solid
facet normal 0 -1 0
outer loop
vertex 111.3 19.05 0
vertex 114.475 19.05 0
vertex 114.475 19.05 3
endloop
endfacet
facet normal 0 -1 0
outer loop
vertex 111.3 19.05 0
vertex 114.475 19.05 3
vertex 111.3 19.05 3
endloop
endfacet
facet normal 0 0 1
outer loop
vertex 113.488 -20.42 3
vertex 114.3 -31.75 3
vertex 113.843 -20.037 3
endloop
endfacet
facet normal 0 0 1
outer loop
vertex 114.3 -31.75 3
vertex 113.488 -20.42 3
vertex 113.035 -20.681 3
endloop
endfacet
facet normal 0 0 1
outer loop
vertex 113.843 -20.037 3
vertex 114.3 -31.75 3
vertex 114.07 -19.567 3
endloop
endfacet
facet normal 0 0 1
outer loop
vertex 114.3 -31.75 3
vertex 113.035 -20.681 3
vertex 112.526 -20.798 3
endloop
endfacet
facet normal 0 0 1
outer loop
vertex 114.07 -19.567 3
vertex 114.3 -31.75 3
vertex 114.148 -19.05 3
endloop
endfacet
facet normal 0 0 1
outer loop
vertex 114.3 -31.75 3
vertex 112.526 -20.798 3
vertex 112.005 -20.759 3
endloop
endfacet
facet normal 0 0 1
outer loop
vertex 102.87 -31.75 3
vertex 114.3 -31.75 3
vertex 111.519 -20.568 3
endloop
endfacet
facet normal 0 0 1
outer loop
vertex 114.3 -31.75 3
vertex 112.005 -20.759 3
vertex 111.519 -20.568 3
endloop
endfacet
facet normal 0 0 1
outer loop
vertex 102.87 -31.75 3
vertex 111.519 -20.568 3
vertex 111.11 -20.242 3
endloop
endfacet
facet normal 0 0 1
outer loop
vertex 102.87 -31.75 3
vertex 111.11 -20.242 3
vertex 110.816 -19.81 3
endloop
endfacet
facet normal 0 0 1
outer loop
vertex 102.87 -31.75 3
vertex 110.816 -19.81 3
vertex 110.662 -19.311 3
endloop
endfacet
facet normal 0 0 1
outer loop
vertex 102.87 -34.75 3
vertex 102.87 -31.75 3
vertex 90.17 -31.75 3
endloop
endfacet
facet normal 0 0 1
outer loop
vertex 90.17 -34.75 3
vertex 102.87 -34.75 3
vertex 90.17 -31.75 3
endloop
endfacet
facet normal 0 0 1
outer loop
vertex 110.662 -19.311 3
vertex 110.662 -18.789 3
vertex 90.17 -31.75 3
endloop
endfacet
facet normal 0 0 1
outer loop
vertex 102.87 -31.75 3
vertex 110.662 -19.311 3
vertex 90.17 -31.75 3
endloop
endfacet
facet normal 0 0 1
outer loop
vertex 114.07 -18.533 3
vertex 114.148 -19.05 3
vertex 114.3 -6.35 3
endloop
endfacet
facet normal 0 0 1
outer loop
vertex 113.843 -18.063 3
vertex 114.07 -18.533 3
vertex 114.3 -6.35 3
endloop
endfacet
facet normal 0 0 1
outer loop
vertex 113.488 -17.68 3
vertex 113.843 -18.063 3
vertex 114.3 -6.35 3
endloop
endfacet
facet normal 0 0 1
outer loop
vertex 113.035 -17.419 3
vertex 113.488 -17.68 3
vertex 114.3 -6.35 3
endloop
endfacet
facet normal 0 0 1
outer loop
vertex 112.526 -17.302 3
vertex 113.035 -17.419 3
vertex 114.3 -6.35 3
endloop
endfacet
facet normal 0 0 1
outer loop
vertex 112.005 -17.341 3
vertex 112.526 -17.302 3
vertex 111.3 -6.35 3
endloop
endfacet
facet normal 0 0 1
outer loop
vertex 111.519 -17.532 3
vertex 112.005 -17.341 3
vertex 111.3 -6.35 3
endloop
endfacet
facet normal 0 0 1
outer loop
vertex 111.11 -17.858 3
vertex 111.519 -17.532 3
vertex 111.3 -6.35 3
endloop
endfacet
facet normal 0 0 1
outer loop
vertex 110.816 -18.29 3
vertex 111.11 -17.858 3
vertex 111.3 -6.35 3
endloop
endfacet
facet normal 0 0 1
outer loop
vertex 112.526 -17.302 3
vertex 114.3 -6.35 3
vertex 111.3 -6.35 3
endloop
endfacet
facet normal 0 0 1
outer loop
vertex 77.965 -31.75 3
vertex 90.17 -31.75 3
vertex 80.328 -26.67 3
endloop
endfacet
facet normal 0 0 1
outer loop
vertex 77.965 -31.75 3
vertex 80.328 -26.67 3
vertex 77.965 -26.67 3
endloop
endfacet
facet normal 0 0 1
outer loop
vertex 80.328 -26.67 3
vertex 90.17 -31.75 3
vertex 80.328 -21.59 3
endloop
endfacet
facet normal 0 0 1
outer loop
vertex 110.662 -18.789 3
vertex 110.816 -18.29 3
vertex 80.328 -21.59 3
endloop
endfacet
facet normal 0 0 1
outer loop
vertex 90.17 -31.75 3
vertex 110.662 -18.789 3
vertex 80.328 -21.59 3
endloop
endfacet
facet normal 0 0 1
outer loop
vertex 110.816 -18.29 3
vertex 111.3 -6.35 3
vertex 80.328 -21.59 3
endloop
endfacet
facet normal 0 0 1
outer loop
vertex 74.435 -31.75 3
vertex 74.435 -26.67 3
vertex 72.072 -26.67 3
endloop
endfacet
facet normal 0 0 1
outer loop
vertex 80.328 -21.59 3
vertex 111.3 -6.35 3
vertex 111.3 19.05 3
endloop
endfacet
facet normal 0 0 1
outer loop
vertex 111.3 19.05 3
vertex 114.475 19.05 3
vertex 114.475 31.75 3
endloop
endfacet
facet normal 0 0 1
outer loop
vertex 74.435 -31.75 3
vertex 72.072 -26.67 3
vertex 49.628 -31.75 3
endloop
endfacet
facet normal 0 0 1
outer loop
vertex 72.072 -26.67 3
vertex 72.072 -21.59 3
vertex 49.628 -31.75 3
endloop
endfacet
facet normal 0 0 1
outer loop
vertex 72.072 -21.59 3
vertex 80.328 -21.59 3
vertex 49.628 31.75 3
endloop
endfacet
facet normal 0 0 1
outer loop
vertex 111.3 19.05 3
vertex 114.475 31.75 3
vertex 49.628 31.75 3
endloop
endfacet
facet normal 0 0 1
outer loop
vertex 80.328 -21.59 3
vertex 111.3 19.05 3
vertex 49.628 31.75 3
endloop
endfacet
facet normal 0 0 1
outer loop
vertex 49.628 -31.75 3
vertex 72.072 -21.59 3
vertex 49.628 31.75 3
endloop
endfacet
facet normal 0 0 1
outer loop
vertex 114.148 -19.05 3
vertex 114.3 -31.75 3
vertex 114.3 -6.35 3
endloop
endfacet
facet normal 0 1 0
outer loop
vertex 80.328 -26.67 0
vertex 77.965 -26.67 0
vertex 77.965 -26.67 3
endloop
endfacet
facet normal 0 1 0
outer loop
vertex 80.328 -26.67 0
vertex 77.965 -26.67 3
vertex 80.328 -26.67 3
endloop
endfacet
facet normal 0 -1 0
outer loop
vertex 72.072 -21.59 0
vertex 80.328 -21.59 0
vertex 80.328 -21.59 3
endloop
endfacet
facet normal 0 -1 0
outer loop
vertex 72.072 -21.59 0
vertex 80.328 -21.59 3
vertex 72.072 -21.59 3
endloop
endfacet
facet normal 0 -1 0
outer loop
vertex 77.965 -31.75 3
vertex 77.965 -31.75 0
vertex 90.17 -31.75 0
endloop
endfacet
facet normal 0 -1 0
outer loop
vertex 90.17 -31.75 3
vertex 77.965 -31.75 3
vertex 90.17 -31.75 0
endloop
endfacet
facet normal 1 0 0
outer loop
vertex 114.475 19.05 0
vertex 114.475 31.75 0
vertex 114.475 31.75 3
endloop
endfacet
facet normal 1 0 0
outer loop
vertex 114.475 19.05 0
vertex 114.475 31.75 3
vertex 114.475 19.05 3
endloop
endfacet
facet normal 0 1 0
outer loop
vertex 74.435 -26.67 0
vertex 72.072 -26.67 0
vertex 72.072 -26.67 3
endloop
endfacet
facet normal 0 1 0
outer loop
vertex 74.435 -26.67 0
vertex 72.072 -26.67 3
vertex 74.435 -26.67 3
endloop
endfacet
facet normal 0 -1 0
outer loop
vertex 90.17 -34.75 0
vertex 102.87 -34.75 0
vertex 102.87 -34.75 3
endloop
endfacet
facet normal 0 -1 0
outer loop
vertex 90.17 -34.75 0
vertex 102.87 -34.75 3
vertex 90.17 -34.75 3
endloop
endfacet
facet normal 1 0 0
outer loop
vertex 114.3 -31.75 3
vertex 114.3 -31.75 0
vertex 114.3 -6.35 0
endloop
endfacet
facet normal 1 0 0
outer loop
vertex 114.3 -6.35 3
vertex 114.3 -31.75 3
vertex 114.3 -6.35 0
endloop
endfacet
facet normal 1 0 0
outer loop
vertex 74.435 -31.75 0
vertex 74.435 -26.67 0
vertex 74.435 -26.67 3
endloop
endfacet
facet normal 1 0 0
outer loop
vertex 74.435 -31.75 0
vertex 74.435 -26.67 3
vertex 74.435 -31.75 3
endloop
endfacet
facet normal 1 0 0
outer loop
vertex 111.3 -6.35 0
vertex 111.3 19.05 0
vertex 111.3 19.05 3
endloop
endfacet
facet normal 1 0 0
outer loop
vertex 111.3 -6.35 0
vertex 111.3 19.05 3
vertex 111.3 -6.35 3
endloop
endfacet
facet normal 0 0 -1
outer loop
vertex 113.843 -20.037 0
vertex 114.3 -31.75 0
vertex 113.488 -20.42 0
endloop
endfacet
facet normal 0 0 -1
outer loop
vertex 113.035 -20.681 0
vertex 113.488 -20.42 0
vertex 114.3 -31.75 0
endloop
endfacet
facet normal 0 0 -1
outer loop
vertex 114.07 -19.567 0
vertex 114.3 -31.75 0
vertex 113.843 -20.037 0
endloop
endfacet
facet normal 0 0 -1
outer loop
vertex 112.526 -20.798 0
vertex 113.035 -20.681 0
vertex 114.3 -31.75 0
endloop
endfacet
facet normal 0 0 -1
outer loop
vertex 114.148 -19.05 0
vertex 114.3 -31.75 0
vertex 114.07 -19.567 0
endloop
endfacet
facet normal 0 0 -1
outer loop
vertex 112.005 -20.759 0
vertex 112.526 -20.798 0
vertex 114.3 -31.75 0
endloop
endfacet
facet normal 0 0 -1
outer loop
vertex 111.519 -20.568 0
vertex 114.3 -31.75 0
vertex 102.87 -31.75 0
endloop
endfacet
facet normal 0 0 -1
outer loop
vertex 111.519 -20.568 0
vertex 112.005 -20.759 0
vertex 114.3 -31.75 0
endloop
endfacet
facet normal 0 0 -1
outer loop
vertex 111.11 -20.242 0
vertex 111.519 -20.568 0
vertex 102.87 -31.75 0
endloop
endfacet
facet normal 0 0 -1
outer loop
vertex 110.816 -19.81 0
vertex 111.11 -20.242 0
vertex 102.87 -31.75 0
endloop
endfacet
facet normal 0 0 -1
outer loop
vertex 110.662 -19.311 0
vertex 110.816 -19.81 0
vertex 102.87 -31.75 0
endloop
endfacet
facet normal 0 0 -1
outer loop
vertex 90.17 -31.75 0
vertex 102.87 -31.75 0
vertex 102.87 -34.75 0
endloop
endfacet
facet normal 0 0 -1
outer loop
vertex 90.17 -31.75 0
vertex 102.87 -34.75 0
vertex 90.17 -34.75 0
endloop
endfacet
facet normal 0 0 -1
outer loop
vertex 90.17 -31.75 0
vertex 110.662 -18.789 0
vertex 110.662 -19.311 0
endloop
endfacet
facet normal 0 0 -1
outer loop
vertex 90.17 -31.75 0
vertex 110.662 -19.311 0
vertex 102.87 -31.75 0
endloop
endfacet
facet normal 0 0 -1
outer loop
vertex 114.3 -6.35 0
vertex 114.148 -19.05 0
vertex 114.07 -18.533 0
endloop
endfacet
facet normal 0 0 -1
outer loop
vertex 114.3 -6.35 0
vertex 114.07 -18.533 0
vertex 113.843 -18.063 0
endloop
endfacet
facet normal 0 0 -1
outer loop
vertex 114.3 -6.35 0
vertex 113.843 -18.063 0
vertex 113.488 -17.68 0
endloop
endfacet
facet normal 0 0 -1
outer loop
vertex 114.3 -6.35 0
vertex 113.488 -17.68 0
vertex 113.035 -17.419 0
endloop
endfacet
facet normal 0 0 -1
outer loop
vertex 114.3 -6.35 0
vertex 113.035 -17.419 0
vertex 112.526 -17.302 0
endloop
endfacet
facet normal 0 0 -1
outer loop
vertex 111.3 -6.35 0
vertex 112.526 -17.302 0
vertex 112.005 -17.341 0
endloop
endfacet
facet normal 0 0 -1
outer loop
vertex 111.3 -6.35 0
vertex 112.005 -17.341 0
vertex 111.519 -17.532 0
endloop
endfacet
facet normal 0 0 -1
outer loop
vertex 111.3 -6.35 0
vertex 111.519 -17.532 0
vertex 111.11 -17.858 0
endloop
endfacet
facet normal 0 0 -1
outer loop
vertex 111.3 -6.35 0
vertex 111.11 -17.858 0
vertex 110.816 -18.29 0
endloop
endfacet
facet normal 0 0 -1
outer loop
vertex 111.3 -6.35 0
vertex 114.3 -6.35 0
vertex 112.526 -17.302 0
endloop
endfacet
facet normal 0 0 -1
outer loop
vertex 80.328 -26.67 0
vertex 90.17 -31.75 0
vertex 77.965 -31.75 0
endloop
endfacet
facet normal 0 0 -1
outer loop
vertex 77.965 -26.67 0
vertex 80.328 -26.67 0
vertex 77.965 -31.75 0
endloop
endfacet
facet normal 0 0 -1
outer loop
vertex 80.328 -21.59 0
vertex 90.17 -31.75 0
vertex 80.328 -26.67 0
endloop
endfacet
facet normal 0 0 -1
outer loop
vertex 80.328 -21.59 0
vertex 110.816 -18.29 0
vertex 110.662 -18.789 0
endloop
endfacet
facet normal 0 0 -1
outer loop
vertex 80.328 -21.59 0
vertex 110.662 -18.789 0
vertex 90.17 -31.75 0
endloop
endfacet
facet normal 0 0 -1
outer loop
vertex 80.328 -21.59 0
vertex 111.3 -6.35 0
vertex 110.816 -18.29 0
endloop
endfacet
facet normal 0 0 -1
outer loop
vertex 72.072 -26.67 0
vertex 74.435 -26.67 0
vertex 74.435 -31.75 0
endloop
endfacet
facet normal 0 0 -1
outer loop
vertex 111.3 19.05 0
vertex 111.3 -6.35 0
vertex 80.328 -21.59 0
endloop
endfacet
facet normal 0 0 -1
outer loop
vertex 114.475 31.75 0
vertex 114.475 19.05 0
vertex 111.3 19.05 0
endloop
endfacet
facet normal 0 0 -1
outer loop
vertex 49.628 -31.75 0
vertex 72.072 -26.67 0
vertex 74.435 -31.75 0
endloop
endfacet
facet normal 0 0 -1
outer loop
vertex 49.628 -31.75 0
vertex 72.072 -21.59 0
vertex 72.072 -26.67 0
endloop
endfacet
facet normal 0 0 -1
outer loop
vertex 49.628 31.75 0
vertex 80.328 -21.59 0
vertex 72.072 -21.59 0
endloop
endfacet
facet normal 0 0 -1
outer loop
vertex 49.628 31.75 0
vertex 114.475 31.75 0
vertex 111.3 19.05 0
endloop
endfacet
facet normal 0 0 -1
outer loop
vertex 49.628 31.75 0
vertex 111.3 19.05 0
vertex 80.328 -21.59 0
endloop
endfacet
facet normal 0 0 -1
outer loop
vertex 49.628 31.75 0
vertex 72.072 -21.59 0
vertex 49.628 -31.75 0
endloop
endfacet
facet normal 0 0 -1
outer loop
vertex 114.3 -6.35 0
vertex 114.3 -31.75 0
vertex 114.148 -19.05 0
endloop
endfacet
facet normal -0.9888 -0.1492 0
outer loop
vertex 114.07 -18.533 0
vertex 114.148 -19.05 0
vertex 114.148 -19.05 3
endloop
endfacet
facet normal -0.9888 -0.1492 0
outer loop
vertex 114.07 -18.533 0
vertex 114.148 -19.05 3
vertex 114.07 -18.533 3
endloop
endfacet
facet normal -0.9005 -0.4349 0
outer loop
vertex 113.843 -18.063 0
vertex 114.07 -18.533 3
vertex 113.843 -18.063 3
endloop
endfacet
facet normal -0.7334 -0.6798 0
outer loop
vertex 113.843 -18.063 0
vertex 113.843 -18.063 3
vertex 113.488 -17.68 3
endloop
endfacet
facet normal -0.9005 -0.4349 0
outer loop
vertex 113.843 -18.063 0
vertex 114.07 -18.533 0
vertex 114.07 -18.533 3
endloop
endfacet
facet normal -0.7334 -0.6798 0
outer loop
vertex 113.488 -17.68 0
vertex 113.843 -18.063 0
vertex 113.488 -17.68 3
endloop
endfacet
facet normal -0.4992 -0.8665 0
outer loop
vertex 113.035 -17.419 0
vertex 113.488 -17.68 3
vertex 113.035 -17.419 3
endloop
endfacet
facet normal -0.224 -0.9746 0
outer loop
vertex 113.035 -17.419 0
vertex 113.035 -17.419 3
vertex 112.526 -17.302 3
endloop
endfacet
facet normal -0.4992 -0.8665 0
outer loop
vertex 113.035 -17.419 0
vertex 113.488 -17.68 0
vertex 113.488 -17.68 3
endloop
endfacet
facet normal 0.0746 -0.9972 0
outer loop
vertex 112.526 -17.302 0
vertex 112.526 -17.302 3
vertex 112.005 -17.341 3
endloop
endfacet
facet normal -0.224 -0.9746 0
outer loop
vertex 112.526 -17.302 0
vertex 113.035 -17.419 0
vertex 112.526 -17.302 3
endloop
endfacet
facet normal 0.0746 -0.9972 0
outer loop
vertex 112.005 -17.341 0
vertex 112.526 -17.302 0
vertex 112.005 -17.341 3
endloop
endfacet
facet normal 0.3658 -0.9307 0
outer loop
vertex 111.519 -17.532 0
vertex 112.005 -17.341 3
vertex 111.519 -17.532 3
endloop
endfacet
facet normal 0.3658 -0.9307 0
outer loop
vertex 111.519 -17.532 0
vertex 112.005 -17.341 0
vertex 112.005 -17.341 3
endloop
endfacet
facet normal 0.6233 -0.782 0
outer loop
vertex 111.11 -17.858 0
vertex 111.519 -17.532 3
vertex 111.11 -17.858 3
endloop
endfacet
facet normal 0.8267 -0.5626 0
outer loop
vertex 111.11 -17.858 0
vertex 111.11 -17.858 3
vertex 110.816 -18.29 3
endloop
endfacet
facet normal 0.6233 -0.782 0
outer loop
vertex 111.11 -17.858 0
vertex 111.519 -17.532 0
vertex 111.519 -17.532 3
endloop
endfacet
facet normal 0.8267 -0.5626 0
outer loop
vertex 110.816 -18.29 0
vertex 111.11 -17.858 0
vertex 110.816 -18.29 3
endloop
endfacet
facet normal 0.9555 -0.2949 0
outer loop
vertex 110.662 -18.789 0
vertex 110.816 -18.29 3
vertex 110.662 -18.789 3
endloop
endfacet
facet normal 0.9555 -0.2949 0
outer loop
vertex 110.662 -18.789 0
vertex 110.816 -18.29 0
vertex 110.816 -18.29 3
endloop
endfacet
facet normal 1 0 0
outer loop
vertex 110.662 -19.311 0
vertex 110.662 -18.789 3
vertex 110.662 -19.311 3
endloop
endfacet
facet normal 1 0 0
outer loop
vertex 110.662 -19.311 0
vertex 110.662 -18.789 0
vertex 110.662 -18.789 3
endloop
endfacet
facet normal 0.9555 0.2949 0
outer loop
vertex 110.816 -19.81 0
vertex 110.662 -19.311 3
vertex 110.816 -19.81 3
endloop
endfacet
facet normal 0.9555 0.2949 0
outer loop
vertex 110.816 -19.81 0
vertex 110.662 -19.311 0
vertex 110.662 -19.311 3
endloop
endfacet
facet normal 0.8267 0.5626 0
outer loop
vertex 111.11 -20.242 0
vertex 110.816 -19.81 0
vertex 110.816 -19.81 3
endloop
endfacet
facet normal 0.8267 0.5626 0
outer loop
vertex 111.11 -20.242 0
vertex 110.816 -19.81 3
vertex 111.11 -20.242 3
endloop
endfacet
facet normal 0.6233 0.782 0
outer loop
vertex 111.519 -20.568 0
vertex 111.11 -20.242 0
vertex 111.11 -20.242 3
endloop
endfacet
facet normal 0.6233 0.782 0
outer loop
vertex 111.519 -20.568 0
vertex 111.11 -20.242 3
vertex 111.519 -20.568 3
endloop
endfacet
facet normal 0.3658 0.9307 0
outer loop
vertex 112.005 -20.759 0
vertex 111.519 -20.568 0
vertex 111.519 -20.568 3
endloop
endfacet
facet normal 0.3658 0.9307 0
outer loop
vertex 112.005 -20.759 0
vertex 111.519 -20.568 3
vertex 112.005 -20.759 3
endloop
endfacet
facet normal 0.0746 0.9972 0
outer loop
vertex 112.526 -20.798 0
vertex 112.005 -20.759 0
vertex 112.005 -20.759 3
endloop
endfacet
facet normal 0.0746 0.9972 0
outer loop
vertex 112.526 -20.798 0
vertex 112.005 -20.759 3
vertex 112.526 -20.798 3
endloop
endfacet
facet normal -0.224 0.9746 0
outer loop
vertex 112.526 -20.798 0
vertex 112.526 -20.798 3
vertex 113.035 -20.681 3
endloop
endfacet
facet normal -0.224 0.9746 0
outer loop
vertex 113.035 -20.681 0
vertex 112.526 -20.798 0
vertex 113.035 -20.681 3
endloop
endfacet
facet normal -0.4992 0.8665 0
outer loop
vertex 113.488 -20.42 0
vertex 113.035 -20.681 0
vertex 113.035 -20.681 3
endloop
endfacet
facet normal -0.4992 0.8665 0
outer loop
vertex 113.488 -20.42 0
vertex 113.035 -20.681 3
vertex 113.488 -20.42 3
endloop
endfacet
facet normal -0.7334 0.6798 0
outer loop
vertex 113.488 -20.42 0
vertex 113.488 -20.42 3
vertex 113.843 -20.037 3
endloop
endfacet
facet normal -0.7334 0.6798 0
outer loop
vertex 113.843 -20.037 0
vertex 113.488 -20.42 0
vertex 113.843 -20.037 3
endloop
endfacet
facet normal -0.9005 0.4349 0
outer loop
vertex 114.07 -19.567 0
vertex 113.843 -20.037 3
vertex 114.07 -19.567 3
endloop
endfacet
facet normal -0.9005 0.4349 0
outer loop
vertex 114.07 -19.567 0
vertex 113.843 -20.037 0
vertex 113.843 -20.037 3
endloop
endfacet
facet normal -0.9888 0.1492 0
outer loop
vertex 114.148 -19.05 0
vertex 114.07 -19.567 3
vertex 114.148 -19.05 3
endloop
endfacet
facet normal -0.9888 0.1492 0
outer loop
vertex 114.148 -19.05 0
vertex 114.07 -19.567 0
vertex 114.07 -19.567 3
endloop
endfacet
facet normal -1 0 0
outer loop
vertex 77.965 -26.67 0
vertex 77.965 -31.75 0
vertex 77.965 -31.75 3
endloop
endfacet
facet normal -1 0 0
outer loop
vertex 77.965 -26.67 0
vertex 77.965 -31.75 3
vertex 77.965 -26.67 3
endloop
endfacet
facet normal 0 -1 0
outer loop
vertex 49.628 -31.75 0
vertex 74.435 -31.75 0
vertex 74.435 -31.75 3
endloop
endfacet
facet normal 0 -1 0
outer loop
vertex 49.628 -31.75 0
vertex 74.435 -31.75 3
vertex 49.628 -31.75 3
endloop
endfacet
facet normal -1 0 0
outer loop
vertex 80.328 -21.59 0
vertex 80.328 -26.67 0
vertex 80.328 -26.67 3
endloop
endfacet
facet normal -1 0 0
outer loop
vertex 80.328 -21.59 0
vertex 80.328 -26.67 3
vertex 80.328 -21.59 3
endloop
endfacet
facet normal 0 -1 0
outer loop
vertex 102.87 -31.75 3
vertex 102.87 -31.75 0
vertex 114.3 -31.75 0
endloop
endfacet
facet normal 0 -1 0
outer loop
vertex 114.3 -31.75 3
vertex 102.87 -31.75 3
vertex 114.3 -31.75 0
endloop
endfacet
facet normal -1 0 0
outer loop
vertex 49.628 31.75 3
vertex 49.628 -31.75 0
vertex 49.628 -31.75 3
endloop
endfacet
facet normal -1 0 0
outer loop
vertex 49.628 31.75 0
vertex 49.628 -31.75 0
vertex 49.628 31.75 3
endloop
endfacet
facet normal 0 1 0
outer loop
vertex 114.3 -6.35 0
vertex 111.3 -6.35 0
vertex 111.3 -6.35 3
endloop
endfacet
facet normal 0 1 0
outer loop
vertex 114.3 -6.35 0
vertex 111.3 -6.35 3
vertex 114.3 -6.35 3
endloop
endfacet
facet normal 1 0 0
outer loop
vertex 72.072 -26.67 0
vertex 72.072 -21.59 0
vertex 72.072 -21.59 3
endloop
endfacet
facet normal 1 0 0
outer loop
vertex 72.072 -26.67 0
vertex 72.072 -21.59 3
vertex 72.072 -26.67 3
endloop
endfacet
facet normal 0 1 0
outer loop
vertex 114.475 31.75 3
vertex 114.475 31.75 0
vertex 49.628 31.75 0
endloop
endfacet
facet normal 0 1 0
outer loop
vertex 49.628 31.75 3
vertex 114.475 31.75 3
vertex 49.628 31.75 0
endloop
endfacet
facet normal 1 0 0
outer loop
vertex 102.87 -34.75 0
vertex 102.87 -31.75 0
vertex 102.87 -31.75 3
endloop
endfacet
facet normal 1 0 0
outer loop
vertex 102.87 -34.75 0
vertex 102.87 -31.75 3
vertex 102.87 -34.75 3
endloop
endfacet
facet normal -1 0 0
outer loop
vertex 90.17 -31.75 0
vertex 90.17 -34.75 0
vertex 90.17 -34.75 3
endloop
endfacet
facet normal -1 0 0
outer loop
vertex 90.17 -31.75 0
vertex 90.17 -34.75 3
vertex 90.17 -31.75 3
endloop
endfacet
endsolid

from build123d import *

# Parameters (mm, degrees)
SKETCH1_R           = 1.7526
BOSS_EXTRUDE1_DEPTH = 3


with BuildPart() as part:
    # Sketch1 → Boss-Extrude1 (new body)
    with BuildSketch(Plane.XY):
        Polygon((49.628328589, 31.75), (111.125, 31.75), (114.475, 31.75), (114.475, 19.05), (111.3, 19.05), (111.3, -6.35), (114.3, -6.35), (114.3, -18.229405084), (114.3, -19.870594916), (114.3, -31.75), (111.125, -31.75), (102.87, -31.75), (102.87, -34.75), (90.17, -34.75), (90.17, -31.75), (88.19515, -31.75), (77.9653, -31.75), (77.9653, -26.67), (80.3275, -26.67), (80.3275, -21.59), (72.0725, -21.59), (72.0725, -26.67), (74.4347, -26.67), (74.4347, -31.75), (49.628328589, -31.75), align=None)
        with Locations((112.395, -19.05)):
            Circle(SKETCH1_R, mode=Mode.SUBTRACT)
    extrude(amount=BOSS_EXTRUDE1_DEPTH)


solid = part.part
